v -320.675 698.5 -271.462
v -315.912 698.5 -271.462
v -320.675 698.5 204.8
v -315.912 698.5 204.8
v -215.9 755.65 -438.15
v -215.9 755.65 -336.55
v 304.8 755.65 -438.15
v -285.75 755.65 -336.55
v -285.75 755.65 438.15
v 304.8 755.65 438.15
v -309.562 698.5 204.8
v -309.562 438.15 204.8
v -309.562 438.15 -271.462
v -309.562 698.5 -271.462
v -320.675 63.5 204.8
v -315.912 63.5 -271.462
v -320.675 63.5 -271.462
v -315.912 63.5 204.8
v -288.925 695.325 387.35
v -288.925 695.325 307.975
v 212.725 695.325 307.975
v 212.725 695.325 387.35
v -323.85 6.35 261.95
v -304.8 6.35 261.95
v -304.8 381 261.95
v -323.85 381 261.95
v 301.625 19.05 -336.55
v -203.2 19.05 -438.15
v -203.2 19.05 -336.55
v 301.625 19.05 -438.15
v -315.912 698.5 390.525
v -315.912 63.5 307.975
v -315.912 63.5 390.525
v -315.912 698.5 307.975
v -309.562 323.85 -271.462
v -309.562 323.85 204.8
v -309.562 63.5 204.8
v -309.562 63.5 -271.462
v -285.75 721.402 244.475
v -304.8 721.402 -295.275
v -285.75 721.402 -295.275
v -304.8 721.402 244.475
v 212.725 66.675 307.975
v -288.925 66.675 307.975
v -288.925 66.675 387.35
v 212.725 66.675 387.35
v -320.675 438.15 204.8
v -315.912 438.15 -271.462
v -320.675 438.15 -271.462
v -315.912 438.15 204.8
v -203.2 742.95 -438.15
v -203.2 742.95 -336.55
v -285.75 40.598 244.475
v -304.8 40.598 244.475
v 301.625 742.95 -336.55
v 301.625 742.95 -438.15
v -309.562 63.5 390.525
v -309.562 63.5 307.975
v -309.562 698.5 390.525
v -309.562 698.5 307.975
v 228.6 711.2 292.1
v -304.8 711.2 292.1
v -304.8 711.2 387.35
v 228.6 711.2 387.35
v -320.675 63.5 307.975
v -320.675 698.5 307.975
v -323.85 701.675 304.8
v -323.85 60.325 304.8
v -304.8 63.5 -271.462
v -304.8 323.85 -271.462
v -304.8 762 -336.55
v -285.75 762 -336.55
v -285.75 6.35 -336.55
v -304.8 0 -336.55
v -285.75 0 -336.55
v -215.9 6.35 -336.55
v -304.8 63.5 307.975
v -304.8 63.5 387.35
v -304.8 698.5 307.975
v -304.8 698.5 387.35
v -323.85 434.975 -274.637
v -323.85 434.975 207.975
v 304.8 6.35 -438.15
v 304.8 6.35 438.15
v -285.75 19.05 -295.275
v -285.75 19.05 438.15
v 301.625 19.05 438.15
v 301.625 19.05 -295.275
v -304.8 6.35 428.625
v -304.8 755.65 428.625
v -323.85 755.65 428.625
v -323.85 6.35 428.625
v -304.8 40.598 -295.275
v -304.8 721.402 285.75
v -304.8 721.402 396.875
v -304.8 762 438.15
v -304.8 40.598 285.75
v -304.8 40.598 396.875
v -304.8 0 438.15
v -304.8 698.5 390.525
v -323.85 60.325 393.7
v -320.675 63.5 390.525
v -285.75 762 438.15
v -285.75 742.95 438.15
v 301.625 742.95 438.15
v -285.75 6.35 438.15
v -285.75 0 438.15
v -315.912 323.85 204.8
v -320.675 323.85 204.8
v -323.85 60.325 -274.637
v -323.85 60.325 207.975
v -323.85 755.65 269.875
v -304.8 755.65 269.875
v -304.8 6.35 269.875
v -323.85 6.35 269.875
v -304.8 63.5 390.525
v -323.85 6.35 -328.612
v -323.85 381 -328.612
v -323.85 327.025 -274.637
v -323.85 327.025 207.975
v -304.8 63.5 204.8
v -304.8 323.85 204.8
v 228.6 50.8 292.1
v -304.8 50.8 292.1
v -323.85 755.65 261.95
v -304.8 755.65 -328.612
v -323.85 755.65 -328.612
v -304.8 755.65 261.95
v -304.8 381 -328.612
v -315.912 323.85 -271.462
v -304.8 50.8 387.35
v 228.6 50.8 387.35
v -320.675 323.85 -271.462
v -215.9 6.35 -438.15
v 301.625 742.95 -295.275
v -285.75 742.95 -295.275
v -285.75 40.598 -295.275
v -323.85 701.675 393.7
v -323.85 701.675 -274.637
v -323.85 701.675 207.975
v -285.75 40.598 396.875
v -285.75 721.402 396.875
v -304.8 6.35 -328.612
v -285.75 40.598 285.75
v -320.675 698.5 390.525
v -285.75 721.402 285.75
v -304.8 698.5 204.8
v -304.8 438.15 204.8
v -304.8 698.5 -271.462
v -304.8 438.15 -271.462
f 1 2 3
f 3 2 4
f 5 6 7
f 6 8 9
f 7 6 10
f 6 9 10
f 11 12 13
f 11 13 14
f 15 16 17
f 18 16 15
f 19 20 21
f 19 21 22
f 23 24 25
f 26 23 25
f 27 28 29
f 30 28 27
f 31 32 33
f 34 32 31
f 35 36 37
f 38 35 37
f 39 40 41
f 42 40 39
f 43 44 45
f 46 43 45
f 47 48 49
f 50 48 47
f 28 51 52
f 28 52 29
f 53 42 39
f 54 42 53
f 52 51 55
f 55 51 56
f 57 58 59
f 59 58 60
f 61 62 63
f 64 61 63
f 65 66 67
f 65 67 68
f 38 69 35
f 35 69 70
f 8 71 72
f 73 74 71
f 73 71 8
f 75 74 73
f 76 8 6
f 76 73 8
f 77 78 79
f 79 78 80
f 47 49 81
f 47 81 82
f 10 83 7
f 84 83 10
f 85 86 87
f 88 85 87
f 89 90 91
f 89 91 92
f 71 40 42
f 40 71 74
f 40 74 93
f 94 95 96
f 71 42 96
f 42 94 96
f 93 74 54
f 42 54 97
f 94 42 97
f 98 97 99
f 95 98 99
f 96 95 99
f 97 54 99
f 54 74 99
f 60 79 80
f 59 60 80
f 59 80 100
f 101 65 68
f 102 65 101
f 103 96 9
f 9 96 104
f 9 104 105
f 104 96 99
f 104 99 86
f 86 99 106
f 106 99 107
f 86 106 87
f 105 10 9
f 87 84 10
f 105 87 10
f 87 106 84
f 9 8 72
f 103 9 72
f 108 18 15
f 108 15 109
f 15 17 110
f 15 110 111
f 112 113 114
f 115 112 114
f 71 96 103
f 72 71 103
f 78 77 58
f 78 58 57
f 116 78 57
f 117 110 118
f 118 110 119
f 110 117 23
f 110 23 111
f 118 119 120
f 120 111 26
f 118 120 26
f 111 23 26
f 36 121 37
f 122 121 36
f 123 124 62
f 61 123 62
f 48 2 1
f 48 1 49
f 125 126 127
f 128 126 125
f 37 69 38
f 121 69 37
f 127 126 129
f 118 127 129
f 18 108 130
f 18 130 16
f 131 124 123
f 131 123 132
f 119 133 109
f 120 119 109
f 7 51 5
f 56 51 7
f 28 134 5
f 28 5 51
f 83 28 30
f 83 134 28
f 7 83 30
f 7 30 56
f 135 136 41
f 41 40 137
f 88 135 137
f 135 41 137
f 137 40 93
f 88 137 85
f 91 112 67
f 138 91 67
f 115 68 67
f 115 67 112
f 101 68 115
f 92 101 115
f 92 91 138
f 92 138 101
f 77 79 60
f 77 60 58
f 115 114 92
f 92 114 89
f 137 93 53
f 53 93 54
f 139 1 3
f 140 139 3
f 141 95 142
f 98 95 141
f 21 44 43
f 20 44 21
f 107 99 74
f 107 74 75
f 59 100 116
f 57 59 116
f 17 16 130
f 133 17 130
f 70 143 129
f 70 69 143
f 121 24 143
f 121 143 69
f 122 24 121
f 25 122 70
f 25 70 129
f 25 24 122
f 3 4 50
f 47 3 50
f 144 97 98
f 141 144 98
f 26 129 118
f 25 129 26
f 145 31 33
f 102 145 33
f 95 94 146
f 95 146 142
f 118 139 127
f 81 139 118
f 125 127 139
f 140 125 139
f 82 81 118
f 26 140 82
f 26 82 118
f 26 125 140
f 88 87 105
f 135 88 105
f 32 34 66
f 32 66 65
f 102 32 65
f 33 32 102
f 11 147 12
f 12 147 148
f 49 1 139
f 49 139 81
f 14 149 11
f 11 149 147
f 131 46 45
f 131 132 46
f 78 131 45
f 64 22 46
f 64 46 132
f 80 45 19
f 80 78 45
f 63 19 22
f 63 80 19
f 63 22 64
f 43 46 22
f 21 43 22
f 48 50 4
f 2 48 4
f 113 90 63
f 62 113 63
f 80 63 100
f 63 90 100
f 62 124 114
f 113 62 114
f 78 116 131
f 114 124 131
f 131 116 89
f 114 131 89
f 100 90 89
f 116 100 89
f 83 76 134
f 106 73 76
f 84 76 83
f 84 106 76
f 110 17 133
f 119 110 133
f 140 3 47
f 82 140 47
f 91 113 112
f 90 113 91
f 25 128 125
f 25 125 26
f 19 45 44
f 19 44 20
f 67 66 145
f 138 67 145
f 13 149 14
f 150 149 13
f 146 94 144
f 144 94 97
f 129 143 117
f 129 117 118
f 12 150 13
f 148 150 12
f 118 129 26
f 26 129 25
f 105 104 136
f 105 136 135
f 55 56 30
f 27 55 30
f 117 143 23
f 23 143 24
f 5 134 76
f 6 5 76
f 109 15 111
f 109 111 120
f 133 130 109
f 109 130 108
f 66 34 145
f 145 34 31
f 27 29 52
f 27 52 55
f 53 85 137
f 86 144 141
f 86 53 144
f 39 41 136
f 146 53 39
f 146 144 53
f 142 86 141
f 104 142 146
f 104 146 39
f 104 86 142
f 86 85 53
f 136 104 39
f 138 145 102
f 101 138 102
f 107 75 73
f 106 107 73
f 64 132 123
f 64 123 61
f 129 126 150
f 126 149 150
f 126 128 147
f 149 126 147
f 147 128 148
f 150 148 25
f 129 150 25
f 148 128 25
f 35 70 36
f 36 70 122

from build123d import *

# Parameters (mm, degrees)
F0_W          = 609.6
F0_H          = 876.3
F1_DEPTH      = 762
F2_W          = 88.9
F2_H          = 101.6
F3_DEPTH      = 762.001
F4_W          = 680.8032786885
F4_H          = 692.15
F5_DEPTH      = 19.05
F6_W          = 590.55
F6_H          = 6.35
F7_DEPTH      = 876.301
F8_W          = 587.375
F8_H          = 723.9
F9_DEPTH      = 733.425
F10_W         = 680.8032786885
F10_H         = 41.275
F11_DEPTH     = 19.05
F12_W         = 374.65
F12_H         = 590.5627
F12_W_2       = 260.35
F12_H_2       = 476.2627
F13_DEPTH     = 19.05
F14_W         = 6.35
F14_H         = 260.35
F15_DEPTH     = 476.2627
F16_SIZE      = 3.175
F17_W         = 749.3
F17_H         = 158.75
F17_W_2       = 635
F17_H_2       = 82.55
F18_DEPTH     = 19.05
F19_W         = 6.35
F19_H         = 635
F20_DEPTH     = 82.55
F21_SIZE      = 3.175
F22_W         = 504.825
F22_H         = 723.9
F23_DEPTH     = 101.6
F24_W         = 660.4
F24_H         = 95.25
F25_DEPTH     = 533.4
F26_T         = 15.875
F26_T3_DEPTH  = 37.249261314
F26_T5_DEPTH  = 37.249261314
F26_T7_DEPTH  = 37.249261314
F26_T9_DEPTH  = 37.249261314
F26_T11_DEPTH = 36.5125
F26_T13_DEPTH = 666.75
F26_T15_DEPTH = 114.3
F26_T17_DEPTH = 127
F26_T19_DEPTH = 692.15
F26_T21_DEPTH = 111.125
F26_T23_DEPTH = 36.5125


# Not quite as in the source:
# - a shell that OpenCascade refuses in one call is made with other operations: the cavity is built on its own and cut out


with BuildPart() as f1:
    # F0 (on Front) → F1 (new body)
    with BuildSketch(Plane.XZ):
        Rectangle(F0_W, F0_H)
    extrude(amount=-F1_DEPTH)

    # F2 (on face) → F3 (cut, through all)
    with BuildSketch(Plane.XZ):
        with Locations((-260.35, -387.35)):
            Rectangle(F2_W, F2_H)
    extrude(amount=-F3_DEPTH, mode=Mode.SUBTRACT)

    # F4 (on face) → F5 (cut)
    with BuildSketch(Plane(origin=(-304.8, 0, 0), x_dir=(0, -1, 0), z_dir=(-1, 0, 0))):
        with Locations((-381, 50.8)):
            Rectangle(F4_W, F4_H)
    extrude(amount=-F5_DEPTH, mode=Mode.SUBTRACT)

    # F6 (on face) → F7 (cut, through all)
    with BuildSketch(Plane.XY.offset(438.15)):
        with Locations((9.525, 758.825)):
            Rectangle(F6_W, F6_H)
        with Locations((9.525, 3.175)):
            Rectangle(F6_W, F6_H)
    extrude(amount=-F7_DEPTH, mode=Mode.SUBTRACT)

    # F8 (on face) → F9 (cut, through all)
    with BuildSketch(Plane.XY.offset(438.15)):
        with Locations((7.9375, 381)):
            Rectangle(F8_W, F8_H)
    extrude(amount=-F9_DEPTH, mode=Mode.SUBTRACT)

    # F10 (on face) → F11 (join, through all)
    with BuildSketch(Plane(origin=(-304.8, 0, 0), x_dir=(0, -1, 0), z_dir=(-1, 0, 0))):
        with Locations((-381, 265.1125)):
            Rectangle(F10_W, F10_H)
    extrude(amount=-F11_DEPTH)

    # F22 (on face) → F23 (cut)
    with BuildSketch(Plane(origin=(0, 0, -438.15), x_dir=(1, 0, 0), z_dir=(0, 0, -1))):
        with Locations((49.2125, -381)):
            Rectangle(F22_W, F22_H)
    extrude(amount=-F23_DEPTH, mode=Mode.SUBTRACT)


with BuildPart() as f13:
    # F12 (on face) → F13 (new body)
    with BuildSketch(Plane(origin=(-304.8, 0, 0), x_dir=(0, -1, 0), z_dir=(-1, 0, 0))):
        with Locations((-568.325, -33.33115)):
            Rectangle(F12_W, F12_H)
        with Locations((-568.325, -33.33115)):
            Rectangle(F12_W_2, F12_H_2, mode=Mode.SUBTRACT)
    extrude(amount=F13_DEPTH)

    # F14 (on face) → F15 (join, through all)
    with BuildSketch(Plane.XY.offset(-271.4625)):
        with Locations((-312.7375, 568.325)):
            Rectangle(F14_W, F14_H)
    extrude(amount=F15_DEPTH)

    # F16
    f16_edges = [f13.edges().sort_by_distance(p)[0] for p in [
        (-323.85, 698.5, -33.33115),
        (-323.85, 568.325, -271.4625),
        (-323.85, 438.15, -33.33115),
        (-323.85, 568.325, 204.8002),
    ]]
    chamfer(f16_edges, length=F16_SIZE)


with BuildPart() as f18:
    # F17 (on face) → F18 (new body)
    with BuildSketch(Plane(origin=(-304.8, 0, 0), x_dir=(0, -1, 0), z_dir=(-1, 0, 0))):
        with Locations((-381, 349.25)):
            Rectangle(F17_W, F17_H)
        with Locations((-381, 349.25)):
            Rectangle(F17_W_2, F17_H_2, mode=Mode.SUBTRACT)
    extrude(amount=F18_DEPTH)

    # F19 (on face) → F20 (join, through all)
    with BuildSketch(Plane.XY.offset(307.975)):
        with Locations((-312.7375, 381)):
            Rectangle(F19_W, F19_H)
    extrude(amount=F20_DEPTH)

    # F21
    f21_edges = [f18.edges().sort_by_distance(p)[0] for p in [
        (-323.85, 381, 307.975),
        (-323.85, 698.5, 349.25),
        (-323.85, 381, 390.525),
        (-323.85, 63.5, 349.25),
    ]]
    chamfer(f21_edges, length=F21_SIZE)

    # F24 (on face) → F25 (join)
    with BuildSketch(Plane.YZ.offset(-304.8)):
        with Locations((381, 339.725)):
            Rectangle(F24_W, F24_H)
    extrude(amount=F25_DEPTH)

    # F26: shell of thickness 15.875, made by hand


with BuildPart() as f26_core1:
    # F26_t2: copy of F18
    add(f18.part)

    # the walls: a layer under each face that stays
    f26_faces = [f26_core1.faces().sort_by_distance(p)[0] for p in [
        (-323.85, 630.7666666667, 296.3333333333),
        (-322.2625, 381, 306.3875),
        (-322.2625, 61.9125, 349.25),
        (-322.2625, 700.0875, 349.25),
        (-322.2625, 381, 392.1125),
        (-314.325, 381, 428.625),
        (-314.325, 755.65, 349.25),
        (-314.325, 381, 269.875),
        (-314.325, 6.35, 349.25),
        (-318.29375, 381, 307.975),
        (-318.29375, 63.5, 349.25),
        (-318.29375, 698.5, 349.25),
        (-318.29375, 381, 390.525),
        (-304.8, 630.7666666667, 402.1666666667),
        (-315.9125, 381, 349.25),
        (-38.1, 711.2, 339.725),
        (-38.1, 381, 292.1),
        (-38.1, 50.8, 339.725),
        (-307.18125, 63.5, 349.25),
        (-307.18125, 381, 390.525),
        (-307.18125, 698.5, 349.25),
        (-304.8, 381, 347.6625),
        (228.6, 381, 339.725),
        (-307.18125, 381, 307.975),
        (-309.5625, 381, 349.25),
    ]]
    thicken(f26_faces, amount=-F26_T, mode=Mode.SUBTRACT)

    # F26_s4 → F26_t3 (cut)
    with BuildSketch(Plane(origin=(4.5928978099, 4.5928978099, 4.5928978099), x_dir=(-0.7071067812, 0.7071067812, 0), z_dir=(0.5773502692, 0.5773502692, 0.5773502692))):
        Polygon((271.8908726623, 356.5892701441), (263.7152476623, 342.7036353262), (255.7777476623, 347.2863530879), (255.7777476623, 356.4517886113), align=None)
    extrude(amount=F26_T3_DEPTH, mode=Mode.SUBTRACT)

    # F26_s6 → F26_t5 (cut)
    with BuildSketch(Plane(origin=(-249.4071021901, 249.40710219, -249.4071021901), x_dir=(0.7071067812, 0.7071067812, 0), z_dir=(0.5773502692, -0.5773502692, 0.5773502692))):
        Polygon((266.9244946018, 667.6744674776), (275.1001196018, 653.7888326596), (283.0376196018, 658.3715504213), (283.0376196018, 667.5369859447), align=None)
    extrude(amount=F26_T5_DEPTH, mode=Mode.SUBTRACT)

    # F26_s8 → F26_t7 (cut)
    with BuildSketch(Plane(origin=(-228.2404355234, -228.2404355234, 228.2404355234), x_dir=(-0.7071067812, 0.7071067812, 0), z_dir=(0.5773502692, 0.5773502692, -0.5773502692))):
        Polygon((271.8908726623, 213.7335916339), (255.7777476623, 213.8710731668), (255.7777476623, 223.0365086901), (263.7152476623, 227.6192264518), align=None)
    extrude(amount=F26_T7_DEPTH, mode=Mode.SUBTRACT)

    # F26_s10 → F26_t9 (cut)
    with BuildSketch(Plane(origin=(-482.2404355234, 482.2404355234, 482.2404355234), x_dir=(0.7071067812, 0.7071067812, 0), z_dir=(0.5773502692, -0.5773502692, -0.5773502692))):
        Polygon((266.9244946018, -97.3516056996), (283.0376196018, -97.2141241667), (283.0376196018, -88.0486886433), (275.1001196018, -83.4659708816), align=None)
    extrude(amount=F26_T9_DEPTH, mode=Mode.SUBTRACT)

    # F26_s12 → F26_t11 (cut)
    with BuildSketch(Plane.YZ.offset(-336.55)):
        Polygon((698.34125, 308.13375), (698.5, 292.1), (714.375, 292.1), (714.375, 307.975), align=None)
        Polygon((63.65875, 308.13375), (63.5, 292.1), (47.625, 292.1), (47.625, 307.975), align=None)
        Polygon((63.65875, 390.36625), (47.625, 390.525), (47.625, 406.4), (63.5, 406.4), align=None)
        Polygon((698.34125, 390.36625), (714.375, 390.525), (714.375, 406.4), (698.5, 406.4), align=None)
    extrude(amount=F26_T11_DEPTH, mode=Mode.SUBTRACT)

    # F26_s14 → F26_t13 (cut)
    with BuildSketch(Plane.XZ.offset(-714.375)):
        Polygon((-316.07125, 308.13375), (-315.9125, 292.1), (-300.0375, 292.1), (-300.0375, 307.975), align=None)
        Polygon((-316.07125, 390.36625), (-315.9125, 406.4), (-300.0375, 406.4), (-300.0375, 390.525), align=None)
        Polygon((-309.40375, 390.36625), (-309.5625, 406.4), (-325.4375, 406.4), (-325.4375, 390.525), align=None)
        Polygon((-304.95875, 308.13375), (-288.925, 307.975), (-288.925, 292.1), (-304.8, 292.1), align=None)
        Polygon((-309.40375, 308.13375), (-309.5625, 292.1), (-325.4375, 292.1), (-325.4375, 307.975), align=None)
    extrude(amount=F26_T13_DEPTH, mode=Mode.SUBTRACT)

    # F26_s16 → F26_t15 (cut)
    with BuildSketch(Plane.XY.offset(292.1)):
        Polygon((-316.07125, 63.65875), (-315.9125, 47.625), (-300.0375, 47.625), (-300.0375, 63.5), align=None)
        Polygon((-316.07125, 698.34125), (-315.9125, 714.375), (-300.0375, 714.375), (-300.0375, 698.5), align=None)
        Polygon((-309.40375, 63.65875), (-309.5625, 47.625), (-325.4375, 47.625), (-325.4375, 63.5), align=None)
        Polygon((-309.40375, 698.34125), (-309.5625, 714.375), (-325.4375, 714.375), (-325.4375, 698.5), align=None)
    extrude(amount=F26_T15_DEPTH, mode=Mode.SUBTRACT)

    # F26_s18 → F26_t17 (cut)
    with BuildSketch(Plane.XY.offset(276.225)):
        Polygon((-304.64125, 711.35875), (-320.675, 711.2), (-320.675, 695.325), (-304.8, 695.325), align=None)
        Polygon((-304.64125, 50.64125), (-320.675, 50.8), (-320.675, 66.675), (-304.8, 66.675), align=None)
    extrude(amount=F26_T17_DEPTH, mode=Mode.SUBTRACT)

    # F26_s20 → F26_t19 (cut)
    with BuildSketch(Plane.XZ.offset(-727.075)):
        Polygon((-304.64125, 291.94125), (-320.675, 292.1), (-320.675, 307.975), (-304.8, 307.975), align=None)
    extrude(amount=F26_T19_DEPTH, mode=Mode.SUBTRACT)

    # F26_s22 → F26_t21 (cut)
    with BuildSketch(Plane.XY.offset(292.1)):
        Polygon((-304.95875, 63.65875), (-304.8, 47.625), (-288.925, 47.625), (-288.925, 63.5), align=None)
        Polygon((-304.95875, 698.34125), (-304.8, 714.375), (-288.925, 714.375), (-288.925, 698.5), align=None)
    extrude(amount=F26_T21_DEPTH, mode=Mode.SUBTRACT)

    # F26_s24 → F26_t23 (cut)
    with BuildSketch(Plane.YZ.offset(-325.4375)):
        Polygon((63.65875, 308.13375), (47.625, 307.975), (47.625, 292.1), (63.5, 292.1), align=None)
        Polygon((63.65875, 390.36625), (47.625, 390.525), (47.625, 406.4), (63.5, 406.4), align=None)
        Polygon((698.34125, 390.36625), (698.5, 406.4), (714.375, 406.4), (714.375, 390.525), align=None)
        Polygon((698.34125, 308.13375), (714.375, 307.975), (714.375, 292.1), (698.5, 292.1), align=None)
    extrude(amount=F26_T23_DEPTH, mode=Mode.SUBTRACT)


with BuildPart() as f18_1:
    add(f18.part)

    # what is left inside the walls is the cavity
    f26_cavity = [f26_core1.part.solids().sort_by_distance(p)[0] for p in [
        (45.508333, 381, 308.13375),
    ]]
    add(f26_cavity, mode=Mode.SUBTRACT)


with BuildPart() as f27_1:
    # F27: instance of F13
    add(f13.part.mirror(Plane(origin=(-314.325, 381, -33.33115), x_dir=(1, 0, 0), z_dir=(0, -1, 0))))


solid = Compound([f1.part, f13.part, f18_1.part, f27_1.part])
